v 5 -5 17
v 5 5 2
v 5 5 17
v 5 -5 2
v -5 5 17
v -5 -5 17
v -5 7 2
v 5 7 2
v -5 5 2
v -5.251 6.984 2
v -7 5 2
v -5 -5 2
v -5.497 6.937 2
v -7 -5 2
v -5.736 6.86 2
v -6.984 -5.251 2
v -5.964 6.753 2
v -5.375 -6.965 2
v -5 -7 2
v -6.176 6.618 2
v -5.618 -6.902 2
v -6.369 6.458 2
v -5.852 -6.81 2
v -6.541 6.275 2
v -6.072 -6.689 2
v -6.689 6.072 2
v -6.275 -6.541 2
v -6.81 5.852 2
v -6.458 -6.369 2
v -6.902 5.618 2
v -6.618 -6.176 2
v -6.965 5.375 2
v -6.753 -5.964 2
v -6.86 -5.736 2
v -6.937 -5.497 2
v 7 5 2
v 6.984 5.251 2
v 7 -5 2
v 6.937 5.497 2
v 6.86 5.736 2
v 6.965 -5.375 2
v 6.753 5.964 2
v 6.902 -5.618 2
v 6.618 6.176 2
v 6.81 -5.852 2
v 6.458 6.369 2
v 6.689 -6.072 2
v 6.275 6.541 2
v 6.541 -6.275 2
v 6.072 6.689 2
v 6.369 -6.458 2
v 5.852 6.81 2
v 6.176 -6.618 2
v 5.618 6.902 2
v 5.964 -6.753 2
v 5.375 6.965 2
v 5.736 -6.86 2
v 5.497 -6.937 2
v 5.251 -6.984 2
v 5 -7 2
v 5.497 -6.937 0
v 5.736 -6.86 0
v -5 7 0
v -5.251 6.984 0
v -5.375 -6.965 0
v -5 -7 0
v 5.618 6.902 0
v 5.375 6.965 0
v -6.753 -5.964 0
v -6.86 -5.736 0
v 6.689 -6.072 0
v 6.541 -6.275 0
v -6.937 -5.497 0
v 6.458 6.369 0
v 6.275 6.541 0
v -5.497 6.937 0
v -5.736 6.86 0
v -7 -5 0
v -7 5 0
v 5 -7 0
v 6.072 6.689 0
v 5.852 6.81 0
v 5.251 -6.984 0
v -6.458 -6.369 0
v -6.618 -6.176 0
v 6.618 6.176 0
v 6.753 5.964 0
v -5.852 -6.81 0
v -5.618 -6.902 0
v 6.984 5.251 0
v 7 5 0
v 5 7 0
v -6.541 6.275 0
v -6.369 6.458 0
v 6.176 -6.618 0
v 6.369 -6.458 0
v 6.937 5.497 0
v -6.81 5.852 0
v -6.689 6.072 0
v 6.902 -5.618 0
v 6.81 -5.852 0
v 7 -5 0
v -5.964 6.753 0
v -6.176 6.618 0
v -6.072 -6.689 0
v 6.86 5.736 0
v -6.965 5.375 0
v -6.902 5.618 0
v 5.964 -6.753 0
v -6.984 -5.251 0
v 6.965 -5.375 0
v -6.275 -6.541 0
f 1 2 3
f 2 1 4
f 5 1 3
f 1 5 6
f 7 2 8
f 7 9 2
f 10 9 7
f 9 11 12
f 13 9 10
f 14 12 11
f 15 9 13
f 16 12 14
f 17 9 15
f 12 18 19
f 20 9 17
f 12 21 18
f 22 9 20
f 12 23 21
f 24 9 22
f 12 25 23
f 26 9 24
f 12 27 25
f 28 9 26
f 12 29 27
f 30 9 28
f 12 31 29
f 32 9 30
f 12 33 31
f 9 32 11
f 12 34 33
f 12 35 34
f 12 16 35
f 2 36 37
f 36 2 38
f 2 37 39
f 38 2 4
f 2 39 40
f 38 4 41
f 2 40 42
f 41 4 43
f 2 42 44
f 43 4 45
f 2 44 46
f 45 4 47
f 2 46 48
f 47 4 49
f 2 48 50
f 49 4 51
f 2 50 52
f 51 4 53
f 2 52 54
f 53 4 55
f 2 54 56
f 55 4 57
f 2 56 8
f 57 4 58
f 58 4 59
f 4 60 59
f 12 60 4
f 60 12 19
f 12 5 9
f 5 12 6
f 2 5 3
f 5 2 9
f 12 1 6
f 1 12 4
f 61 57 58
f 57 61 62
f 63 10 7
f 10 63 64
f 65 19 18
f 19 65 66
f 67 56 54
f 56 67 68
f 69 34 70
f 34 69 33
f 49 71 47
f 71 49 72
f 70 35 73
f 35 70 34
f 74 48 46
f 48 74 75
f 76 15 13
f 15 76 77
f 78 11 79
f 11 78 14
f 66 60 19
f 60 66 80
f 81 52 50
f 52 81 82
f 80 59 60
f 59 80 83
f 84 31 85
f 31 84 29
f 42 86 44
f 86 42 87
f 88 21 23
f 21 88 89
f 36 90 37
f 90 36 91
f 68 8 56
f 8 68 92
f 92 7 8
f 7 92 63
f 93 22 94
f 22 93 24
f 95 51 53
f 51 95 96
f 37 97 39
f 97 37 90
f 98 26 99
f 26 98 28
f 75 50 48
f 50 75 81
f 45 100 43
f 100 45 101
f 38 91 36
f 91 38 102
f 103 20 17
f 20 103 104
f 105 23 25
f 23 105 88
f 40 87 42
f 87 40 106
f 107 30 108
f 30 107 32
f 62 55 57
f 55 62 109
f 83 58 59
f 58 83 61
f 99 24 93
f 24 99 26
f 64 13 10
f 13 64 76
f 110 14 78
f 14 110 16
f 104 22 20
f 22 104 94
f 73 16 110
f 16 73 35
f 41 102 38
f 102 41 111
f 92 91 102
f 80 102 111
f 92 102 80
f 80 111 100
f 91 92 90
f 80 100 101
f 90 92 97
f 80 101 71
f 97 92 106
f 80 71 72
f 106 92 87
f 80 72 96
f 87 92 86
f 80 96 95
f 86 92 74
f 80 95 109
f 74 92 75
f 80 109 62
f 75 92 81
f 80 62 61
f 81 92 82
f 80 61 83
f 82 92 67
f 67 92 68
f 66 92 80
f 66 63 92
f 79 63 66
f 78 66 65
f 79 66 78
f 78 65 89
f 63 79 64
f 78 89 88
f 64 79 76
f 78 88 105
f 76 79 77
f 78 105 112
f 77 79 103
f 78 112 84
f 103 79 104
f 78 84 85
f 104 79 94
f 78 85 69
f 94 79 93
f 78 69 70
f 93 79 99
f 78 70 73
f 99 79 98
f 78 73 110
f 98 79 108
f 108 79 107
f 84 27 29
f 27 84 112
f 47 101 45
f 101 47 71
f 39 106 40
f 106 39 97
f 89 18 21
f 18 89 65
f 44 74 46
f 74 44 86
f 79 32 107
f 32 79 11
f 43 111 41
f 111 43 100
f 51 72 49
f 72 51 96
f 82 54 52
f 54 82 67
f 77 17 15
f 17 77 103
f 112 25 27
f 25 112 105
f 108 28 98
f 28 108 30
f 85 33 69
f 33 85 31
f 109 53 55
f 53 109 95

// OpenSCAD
// rectraction test

pCnt=[1,1]; //pillar count
pDist=[20,20];
pDims=[10,10,15];
doBase=true;
baseThck=2;
baseOffset=2;

/* [Hidden] */
$fn=50;
baseDims=[(pCnt.x-1)*pDist.x+pDims.x,(pCnt.y-1)*pDist.y+pDims.y];

zOffset= doBase ? baseThck : 0;

for (ix=[-(pCnt.x-1)/2,(pCnt.x-1)/2],iy=[-(pCnt.y-1)/2,(pCnt.y-1)/2])
  translate([ix*pDist.x,iy*pDist.y,pDims.z/2+zOffset]) cube(pDims,true);

linear_extrude(baseThck) offset(baseOffset) square([baseDims.x,baseDims.y],true);
